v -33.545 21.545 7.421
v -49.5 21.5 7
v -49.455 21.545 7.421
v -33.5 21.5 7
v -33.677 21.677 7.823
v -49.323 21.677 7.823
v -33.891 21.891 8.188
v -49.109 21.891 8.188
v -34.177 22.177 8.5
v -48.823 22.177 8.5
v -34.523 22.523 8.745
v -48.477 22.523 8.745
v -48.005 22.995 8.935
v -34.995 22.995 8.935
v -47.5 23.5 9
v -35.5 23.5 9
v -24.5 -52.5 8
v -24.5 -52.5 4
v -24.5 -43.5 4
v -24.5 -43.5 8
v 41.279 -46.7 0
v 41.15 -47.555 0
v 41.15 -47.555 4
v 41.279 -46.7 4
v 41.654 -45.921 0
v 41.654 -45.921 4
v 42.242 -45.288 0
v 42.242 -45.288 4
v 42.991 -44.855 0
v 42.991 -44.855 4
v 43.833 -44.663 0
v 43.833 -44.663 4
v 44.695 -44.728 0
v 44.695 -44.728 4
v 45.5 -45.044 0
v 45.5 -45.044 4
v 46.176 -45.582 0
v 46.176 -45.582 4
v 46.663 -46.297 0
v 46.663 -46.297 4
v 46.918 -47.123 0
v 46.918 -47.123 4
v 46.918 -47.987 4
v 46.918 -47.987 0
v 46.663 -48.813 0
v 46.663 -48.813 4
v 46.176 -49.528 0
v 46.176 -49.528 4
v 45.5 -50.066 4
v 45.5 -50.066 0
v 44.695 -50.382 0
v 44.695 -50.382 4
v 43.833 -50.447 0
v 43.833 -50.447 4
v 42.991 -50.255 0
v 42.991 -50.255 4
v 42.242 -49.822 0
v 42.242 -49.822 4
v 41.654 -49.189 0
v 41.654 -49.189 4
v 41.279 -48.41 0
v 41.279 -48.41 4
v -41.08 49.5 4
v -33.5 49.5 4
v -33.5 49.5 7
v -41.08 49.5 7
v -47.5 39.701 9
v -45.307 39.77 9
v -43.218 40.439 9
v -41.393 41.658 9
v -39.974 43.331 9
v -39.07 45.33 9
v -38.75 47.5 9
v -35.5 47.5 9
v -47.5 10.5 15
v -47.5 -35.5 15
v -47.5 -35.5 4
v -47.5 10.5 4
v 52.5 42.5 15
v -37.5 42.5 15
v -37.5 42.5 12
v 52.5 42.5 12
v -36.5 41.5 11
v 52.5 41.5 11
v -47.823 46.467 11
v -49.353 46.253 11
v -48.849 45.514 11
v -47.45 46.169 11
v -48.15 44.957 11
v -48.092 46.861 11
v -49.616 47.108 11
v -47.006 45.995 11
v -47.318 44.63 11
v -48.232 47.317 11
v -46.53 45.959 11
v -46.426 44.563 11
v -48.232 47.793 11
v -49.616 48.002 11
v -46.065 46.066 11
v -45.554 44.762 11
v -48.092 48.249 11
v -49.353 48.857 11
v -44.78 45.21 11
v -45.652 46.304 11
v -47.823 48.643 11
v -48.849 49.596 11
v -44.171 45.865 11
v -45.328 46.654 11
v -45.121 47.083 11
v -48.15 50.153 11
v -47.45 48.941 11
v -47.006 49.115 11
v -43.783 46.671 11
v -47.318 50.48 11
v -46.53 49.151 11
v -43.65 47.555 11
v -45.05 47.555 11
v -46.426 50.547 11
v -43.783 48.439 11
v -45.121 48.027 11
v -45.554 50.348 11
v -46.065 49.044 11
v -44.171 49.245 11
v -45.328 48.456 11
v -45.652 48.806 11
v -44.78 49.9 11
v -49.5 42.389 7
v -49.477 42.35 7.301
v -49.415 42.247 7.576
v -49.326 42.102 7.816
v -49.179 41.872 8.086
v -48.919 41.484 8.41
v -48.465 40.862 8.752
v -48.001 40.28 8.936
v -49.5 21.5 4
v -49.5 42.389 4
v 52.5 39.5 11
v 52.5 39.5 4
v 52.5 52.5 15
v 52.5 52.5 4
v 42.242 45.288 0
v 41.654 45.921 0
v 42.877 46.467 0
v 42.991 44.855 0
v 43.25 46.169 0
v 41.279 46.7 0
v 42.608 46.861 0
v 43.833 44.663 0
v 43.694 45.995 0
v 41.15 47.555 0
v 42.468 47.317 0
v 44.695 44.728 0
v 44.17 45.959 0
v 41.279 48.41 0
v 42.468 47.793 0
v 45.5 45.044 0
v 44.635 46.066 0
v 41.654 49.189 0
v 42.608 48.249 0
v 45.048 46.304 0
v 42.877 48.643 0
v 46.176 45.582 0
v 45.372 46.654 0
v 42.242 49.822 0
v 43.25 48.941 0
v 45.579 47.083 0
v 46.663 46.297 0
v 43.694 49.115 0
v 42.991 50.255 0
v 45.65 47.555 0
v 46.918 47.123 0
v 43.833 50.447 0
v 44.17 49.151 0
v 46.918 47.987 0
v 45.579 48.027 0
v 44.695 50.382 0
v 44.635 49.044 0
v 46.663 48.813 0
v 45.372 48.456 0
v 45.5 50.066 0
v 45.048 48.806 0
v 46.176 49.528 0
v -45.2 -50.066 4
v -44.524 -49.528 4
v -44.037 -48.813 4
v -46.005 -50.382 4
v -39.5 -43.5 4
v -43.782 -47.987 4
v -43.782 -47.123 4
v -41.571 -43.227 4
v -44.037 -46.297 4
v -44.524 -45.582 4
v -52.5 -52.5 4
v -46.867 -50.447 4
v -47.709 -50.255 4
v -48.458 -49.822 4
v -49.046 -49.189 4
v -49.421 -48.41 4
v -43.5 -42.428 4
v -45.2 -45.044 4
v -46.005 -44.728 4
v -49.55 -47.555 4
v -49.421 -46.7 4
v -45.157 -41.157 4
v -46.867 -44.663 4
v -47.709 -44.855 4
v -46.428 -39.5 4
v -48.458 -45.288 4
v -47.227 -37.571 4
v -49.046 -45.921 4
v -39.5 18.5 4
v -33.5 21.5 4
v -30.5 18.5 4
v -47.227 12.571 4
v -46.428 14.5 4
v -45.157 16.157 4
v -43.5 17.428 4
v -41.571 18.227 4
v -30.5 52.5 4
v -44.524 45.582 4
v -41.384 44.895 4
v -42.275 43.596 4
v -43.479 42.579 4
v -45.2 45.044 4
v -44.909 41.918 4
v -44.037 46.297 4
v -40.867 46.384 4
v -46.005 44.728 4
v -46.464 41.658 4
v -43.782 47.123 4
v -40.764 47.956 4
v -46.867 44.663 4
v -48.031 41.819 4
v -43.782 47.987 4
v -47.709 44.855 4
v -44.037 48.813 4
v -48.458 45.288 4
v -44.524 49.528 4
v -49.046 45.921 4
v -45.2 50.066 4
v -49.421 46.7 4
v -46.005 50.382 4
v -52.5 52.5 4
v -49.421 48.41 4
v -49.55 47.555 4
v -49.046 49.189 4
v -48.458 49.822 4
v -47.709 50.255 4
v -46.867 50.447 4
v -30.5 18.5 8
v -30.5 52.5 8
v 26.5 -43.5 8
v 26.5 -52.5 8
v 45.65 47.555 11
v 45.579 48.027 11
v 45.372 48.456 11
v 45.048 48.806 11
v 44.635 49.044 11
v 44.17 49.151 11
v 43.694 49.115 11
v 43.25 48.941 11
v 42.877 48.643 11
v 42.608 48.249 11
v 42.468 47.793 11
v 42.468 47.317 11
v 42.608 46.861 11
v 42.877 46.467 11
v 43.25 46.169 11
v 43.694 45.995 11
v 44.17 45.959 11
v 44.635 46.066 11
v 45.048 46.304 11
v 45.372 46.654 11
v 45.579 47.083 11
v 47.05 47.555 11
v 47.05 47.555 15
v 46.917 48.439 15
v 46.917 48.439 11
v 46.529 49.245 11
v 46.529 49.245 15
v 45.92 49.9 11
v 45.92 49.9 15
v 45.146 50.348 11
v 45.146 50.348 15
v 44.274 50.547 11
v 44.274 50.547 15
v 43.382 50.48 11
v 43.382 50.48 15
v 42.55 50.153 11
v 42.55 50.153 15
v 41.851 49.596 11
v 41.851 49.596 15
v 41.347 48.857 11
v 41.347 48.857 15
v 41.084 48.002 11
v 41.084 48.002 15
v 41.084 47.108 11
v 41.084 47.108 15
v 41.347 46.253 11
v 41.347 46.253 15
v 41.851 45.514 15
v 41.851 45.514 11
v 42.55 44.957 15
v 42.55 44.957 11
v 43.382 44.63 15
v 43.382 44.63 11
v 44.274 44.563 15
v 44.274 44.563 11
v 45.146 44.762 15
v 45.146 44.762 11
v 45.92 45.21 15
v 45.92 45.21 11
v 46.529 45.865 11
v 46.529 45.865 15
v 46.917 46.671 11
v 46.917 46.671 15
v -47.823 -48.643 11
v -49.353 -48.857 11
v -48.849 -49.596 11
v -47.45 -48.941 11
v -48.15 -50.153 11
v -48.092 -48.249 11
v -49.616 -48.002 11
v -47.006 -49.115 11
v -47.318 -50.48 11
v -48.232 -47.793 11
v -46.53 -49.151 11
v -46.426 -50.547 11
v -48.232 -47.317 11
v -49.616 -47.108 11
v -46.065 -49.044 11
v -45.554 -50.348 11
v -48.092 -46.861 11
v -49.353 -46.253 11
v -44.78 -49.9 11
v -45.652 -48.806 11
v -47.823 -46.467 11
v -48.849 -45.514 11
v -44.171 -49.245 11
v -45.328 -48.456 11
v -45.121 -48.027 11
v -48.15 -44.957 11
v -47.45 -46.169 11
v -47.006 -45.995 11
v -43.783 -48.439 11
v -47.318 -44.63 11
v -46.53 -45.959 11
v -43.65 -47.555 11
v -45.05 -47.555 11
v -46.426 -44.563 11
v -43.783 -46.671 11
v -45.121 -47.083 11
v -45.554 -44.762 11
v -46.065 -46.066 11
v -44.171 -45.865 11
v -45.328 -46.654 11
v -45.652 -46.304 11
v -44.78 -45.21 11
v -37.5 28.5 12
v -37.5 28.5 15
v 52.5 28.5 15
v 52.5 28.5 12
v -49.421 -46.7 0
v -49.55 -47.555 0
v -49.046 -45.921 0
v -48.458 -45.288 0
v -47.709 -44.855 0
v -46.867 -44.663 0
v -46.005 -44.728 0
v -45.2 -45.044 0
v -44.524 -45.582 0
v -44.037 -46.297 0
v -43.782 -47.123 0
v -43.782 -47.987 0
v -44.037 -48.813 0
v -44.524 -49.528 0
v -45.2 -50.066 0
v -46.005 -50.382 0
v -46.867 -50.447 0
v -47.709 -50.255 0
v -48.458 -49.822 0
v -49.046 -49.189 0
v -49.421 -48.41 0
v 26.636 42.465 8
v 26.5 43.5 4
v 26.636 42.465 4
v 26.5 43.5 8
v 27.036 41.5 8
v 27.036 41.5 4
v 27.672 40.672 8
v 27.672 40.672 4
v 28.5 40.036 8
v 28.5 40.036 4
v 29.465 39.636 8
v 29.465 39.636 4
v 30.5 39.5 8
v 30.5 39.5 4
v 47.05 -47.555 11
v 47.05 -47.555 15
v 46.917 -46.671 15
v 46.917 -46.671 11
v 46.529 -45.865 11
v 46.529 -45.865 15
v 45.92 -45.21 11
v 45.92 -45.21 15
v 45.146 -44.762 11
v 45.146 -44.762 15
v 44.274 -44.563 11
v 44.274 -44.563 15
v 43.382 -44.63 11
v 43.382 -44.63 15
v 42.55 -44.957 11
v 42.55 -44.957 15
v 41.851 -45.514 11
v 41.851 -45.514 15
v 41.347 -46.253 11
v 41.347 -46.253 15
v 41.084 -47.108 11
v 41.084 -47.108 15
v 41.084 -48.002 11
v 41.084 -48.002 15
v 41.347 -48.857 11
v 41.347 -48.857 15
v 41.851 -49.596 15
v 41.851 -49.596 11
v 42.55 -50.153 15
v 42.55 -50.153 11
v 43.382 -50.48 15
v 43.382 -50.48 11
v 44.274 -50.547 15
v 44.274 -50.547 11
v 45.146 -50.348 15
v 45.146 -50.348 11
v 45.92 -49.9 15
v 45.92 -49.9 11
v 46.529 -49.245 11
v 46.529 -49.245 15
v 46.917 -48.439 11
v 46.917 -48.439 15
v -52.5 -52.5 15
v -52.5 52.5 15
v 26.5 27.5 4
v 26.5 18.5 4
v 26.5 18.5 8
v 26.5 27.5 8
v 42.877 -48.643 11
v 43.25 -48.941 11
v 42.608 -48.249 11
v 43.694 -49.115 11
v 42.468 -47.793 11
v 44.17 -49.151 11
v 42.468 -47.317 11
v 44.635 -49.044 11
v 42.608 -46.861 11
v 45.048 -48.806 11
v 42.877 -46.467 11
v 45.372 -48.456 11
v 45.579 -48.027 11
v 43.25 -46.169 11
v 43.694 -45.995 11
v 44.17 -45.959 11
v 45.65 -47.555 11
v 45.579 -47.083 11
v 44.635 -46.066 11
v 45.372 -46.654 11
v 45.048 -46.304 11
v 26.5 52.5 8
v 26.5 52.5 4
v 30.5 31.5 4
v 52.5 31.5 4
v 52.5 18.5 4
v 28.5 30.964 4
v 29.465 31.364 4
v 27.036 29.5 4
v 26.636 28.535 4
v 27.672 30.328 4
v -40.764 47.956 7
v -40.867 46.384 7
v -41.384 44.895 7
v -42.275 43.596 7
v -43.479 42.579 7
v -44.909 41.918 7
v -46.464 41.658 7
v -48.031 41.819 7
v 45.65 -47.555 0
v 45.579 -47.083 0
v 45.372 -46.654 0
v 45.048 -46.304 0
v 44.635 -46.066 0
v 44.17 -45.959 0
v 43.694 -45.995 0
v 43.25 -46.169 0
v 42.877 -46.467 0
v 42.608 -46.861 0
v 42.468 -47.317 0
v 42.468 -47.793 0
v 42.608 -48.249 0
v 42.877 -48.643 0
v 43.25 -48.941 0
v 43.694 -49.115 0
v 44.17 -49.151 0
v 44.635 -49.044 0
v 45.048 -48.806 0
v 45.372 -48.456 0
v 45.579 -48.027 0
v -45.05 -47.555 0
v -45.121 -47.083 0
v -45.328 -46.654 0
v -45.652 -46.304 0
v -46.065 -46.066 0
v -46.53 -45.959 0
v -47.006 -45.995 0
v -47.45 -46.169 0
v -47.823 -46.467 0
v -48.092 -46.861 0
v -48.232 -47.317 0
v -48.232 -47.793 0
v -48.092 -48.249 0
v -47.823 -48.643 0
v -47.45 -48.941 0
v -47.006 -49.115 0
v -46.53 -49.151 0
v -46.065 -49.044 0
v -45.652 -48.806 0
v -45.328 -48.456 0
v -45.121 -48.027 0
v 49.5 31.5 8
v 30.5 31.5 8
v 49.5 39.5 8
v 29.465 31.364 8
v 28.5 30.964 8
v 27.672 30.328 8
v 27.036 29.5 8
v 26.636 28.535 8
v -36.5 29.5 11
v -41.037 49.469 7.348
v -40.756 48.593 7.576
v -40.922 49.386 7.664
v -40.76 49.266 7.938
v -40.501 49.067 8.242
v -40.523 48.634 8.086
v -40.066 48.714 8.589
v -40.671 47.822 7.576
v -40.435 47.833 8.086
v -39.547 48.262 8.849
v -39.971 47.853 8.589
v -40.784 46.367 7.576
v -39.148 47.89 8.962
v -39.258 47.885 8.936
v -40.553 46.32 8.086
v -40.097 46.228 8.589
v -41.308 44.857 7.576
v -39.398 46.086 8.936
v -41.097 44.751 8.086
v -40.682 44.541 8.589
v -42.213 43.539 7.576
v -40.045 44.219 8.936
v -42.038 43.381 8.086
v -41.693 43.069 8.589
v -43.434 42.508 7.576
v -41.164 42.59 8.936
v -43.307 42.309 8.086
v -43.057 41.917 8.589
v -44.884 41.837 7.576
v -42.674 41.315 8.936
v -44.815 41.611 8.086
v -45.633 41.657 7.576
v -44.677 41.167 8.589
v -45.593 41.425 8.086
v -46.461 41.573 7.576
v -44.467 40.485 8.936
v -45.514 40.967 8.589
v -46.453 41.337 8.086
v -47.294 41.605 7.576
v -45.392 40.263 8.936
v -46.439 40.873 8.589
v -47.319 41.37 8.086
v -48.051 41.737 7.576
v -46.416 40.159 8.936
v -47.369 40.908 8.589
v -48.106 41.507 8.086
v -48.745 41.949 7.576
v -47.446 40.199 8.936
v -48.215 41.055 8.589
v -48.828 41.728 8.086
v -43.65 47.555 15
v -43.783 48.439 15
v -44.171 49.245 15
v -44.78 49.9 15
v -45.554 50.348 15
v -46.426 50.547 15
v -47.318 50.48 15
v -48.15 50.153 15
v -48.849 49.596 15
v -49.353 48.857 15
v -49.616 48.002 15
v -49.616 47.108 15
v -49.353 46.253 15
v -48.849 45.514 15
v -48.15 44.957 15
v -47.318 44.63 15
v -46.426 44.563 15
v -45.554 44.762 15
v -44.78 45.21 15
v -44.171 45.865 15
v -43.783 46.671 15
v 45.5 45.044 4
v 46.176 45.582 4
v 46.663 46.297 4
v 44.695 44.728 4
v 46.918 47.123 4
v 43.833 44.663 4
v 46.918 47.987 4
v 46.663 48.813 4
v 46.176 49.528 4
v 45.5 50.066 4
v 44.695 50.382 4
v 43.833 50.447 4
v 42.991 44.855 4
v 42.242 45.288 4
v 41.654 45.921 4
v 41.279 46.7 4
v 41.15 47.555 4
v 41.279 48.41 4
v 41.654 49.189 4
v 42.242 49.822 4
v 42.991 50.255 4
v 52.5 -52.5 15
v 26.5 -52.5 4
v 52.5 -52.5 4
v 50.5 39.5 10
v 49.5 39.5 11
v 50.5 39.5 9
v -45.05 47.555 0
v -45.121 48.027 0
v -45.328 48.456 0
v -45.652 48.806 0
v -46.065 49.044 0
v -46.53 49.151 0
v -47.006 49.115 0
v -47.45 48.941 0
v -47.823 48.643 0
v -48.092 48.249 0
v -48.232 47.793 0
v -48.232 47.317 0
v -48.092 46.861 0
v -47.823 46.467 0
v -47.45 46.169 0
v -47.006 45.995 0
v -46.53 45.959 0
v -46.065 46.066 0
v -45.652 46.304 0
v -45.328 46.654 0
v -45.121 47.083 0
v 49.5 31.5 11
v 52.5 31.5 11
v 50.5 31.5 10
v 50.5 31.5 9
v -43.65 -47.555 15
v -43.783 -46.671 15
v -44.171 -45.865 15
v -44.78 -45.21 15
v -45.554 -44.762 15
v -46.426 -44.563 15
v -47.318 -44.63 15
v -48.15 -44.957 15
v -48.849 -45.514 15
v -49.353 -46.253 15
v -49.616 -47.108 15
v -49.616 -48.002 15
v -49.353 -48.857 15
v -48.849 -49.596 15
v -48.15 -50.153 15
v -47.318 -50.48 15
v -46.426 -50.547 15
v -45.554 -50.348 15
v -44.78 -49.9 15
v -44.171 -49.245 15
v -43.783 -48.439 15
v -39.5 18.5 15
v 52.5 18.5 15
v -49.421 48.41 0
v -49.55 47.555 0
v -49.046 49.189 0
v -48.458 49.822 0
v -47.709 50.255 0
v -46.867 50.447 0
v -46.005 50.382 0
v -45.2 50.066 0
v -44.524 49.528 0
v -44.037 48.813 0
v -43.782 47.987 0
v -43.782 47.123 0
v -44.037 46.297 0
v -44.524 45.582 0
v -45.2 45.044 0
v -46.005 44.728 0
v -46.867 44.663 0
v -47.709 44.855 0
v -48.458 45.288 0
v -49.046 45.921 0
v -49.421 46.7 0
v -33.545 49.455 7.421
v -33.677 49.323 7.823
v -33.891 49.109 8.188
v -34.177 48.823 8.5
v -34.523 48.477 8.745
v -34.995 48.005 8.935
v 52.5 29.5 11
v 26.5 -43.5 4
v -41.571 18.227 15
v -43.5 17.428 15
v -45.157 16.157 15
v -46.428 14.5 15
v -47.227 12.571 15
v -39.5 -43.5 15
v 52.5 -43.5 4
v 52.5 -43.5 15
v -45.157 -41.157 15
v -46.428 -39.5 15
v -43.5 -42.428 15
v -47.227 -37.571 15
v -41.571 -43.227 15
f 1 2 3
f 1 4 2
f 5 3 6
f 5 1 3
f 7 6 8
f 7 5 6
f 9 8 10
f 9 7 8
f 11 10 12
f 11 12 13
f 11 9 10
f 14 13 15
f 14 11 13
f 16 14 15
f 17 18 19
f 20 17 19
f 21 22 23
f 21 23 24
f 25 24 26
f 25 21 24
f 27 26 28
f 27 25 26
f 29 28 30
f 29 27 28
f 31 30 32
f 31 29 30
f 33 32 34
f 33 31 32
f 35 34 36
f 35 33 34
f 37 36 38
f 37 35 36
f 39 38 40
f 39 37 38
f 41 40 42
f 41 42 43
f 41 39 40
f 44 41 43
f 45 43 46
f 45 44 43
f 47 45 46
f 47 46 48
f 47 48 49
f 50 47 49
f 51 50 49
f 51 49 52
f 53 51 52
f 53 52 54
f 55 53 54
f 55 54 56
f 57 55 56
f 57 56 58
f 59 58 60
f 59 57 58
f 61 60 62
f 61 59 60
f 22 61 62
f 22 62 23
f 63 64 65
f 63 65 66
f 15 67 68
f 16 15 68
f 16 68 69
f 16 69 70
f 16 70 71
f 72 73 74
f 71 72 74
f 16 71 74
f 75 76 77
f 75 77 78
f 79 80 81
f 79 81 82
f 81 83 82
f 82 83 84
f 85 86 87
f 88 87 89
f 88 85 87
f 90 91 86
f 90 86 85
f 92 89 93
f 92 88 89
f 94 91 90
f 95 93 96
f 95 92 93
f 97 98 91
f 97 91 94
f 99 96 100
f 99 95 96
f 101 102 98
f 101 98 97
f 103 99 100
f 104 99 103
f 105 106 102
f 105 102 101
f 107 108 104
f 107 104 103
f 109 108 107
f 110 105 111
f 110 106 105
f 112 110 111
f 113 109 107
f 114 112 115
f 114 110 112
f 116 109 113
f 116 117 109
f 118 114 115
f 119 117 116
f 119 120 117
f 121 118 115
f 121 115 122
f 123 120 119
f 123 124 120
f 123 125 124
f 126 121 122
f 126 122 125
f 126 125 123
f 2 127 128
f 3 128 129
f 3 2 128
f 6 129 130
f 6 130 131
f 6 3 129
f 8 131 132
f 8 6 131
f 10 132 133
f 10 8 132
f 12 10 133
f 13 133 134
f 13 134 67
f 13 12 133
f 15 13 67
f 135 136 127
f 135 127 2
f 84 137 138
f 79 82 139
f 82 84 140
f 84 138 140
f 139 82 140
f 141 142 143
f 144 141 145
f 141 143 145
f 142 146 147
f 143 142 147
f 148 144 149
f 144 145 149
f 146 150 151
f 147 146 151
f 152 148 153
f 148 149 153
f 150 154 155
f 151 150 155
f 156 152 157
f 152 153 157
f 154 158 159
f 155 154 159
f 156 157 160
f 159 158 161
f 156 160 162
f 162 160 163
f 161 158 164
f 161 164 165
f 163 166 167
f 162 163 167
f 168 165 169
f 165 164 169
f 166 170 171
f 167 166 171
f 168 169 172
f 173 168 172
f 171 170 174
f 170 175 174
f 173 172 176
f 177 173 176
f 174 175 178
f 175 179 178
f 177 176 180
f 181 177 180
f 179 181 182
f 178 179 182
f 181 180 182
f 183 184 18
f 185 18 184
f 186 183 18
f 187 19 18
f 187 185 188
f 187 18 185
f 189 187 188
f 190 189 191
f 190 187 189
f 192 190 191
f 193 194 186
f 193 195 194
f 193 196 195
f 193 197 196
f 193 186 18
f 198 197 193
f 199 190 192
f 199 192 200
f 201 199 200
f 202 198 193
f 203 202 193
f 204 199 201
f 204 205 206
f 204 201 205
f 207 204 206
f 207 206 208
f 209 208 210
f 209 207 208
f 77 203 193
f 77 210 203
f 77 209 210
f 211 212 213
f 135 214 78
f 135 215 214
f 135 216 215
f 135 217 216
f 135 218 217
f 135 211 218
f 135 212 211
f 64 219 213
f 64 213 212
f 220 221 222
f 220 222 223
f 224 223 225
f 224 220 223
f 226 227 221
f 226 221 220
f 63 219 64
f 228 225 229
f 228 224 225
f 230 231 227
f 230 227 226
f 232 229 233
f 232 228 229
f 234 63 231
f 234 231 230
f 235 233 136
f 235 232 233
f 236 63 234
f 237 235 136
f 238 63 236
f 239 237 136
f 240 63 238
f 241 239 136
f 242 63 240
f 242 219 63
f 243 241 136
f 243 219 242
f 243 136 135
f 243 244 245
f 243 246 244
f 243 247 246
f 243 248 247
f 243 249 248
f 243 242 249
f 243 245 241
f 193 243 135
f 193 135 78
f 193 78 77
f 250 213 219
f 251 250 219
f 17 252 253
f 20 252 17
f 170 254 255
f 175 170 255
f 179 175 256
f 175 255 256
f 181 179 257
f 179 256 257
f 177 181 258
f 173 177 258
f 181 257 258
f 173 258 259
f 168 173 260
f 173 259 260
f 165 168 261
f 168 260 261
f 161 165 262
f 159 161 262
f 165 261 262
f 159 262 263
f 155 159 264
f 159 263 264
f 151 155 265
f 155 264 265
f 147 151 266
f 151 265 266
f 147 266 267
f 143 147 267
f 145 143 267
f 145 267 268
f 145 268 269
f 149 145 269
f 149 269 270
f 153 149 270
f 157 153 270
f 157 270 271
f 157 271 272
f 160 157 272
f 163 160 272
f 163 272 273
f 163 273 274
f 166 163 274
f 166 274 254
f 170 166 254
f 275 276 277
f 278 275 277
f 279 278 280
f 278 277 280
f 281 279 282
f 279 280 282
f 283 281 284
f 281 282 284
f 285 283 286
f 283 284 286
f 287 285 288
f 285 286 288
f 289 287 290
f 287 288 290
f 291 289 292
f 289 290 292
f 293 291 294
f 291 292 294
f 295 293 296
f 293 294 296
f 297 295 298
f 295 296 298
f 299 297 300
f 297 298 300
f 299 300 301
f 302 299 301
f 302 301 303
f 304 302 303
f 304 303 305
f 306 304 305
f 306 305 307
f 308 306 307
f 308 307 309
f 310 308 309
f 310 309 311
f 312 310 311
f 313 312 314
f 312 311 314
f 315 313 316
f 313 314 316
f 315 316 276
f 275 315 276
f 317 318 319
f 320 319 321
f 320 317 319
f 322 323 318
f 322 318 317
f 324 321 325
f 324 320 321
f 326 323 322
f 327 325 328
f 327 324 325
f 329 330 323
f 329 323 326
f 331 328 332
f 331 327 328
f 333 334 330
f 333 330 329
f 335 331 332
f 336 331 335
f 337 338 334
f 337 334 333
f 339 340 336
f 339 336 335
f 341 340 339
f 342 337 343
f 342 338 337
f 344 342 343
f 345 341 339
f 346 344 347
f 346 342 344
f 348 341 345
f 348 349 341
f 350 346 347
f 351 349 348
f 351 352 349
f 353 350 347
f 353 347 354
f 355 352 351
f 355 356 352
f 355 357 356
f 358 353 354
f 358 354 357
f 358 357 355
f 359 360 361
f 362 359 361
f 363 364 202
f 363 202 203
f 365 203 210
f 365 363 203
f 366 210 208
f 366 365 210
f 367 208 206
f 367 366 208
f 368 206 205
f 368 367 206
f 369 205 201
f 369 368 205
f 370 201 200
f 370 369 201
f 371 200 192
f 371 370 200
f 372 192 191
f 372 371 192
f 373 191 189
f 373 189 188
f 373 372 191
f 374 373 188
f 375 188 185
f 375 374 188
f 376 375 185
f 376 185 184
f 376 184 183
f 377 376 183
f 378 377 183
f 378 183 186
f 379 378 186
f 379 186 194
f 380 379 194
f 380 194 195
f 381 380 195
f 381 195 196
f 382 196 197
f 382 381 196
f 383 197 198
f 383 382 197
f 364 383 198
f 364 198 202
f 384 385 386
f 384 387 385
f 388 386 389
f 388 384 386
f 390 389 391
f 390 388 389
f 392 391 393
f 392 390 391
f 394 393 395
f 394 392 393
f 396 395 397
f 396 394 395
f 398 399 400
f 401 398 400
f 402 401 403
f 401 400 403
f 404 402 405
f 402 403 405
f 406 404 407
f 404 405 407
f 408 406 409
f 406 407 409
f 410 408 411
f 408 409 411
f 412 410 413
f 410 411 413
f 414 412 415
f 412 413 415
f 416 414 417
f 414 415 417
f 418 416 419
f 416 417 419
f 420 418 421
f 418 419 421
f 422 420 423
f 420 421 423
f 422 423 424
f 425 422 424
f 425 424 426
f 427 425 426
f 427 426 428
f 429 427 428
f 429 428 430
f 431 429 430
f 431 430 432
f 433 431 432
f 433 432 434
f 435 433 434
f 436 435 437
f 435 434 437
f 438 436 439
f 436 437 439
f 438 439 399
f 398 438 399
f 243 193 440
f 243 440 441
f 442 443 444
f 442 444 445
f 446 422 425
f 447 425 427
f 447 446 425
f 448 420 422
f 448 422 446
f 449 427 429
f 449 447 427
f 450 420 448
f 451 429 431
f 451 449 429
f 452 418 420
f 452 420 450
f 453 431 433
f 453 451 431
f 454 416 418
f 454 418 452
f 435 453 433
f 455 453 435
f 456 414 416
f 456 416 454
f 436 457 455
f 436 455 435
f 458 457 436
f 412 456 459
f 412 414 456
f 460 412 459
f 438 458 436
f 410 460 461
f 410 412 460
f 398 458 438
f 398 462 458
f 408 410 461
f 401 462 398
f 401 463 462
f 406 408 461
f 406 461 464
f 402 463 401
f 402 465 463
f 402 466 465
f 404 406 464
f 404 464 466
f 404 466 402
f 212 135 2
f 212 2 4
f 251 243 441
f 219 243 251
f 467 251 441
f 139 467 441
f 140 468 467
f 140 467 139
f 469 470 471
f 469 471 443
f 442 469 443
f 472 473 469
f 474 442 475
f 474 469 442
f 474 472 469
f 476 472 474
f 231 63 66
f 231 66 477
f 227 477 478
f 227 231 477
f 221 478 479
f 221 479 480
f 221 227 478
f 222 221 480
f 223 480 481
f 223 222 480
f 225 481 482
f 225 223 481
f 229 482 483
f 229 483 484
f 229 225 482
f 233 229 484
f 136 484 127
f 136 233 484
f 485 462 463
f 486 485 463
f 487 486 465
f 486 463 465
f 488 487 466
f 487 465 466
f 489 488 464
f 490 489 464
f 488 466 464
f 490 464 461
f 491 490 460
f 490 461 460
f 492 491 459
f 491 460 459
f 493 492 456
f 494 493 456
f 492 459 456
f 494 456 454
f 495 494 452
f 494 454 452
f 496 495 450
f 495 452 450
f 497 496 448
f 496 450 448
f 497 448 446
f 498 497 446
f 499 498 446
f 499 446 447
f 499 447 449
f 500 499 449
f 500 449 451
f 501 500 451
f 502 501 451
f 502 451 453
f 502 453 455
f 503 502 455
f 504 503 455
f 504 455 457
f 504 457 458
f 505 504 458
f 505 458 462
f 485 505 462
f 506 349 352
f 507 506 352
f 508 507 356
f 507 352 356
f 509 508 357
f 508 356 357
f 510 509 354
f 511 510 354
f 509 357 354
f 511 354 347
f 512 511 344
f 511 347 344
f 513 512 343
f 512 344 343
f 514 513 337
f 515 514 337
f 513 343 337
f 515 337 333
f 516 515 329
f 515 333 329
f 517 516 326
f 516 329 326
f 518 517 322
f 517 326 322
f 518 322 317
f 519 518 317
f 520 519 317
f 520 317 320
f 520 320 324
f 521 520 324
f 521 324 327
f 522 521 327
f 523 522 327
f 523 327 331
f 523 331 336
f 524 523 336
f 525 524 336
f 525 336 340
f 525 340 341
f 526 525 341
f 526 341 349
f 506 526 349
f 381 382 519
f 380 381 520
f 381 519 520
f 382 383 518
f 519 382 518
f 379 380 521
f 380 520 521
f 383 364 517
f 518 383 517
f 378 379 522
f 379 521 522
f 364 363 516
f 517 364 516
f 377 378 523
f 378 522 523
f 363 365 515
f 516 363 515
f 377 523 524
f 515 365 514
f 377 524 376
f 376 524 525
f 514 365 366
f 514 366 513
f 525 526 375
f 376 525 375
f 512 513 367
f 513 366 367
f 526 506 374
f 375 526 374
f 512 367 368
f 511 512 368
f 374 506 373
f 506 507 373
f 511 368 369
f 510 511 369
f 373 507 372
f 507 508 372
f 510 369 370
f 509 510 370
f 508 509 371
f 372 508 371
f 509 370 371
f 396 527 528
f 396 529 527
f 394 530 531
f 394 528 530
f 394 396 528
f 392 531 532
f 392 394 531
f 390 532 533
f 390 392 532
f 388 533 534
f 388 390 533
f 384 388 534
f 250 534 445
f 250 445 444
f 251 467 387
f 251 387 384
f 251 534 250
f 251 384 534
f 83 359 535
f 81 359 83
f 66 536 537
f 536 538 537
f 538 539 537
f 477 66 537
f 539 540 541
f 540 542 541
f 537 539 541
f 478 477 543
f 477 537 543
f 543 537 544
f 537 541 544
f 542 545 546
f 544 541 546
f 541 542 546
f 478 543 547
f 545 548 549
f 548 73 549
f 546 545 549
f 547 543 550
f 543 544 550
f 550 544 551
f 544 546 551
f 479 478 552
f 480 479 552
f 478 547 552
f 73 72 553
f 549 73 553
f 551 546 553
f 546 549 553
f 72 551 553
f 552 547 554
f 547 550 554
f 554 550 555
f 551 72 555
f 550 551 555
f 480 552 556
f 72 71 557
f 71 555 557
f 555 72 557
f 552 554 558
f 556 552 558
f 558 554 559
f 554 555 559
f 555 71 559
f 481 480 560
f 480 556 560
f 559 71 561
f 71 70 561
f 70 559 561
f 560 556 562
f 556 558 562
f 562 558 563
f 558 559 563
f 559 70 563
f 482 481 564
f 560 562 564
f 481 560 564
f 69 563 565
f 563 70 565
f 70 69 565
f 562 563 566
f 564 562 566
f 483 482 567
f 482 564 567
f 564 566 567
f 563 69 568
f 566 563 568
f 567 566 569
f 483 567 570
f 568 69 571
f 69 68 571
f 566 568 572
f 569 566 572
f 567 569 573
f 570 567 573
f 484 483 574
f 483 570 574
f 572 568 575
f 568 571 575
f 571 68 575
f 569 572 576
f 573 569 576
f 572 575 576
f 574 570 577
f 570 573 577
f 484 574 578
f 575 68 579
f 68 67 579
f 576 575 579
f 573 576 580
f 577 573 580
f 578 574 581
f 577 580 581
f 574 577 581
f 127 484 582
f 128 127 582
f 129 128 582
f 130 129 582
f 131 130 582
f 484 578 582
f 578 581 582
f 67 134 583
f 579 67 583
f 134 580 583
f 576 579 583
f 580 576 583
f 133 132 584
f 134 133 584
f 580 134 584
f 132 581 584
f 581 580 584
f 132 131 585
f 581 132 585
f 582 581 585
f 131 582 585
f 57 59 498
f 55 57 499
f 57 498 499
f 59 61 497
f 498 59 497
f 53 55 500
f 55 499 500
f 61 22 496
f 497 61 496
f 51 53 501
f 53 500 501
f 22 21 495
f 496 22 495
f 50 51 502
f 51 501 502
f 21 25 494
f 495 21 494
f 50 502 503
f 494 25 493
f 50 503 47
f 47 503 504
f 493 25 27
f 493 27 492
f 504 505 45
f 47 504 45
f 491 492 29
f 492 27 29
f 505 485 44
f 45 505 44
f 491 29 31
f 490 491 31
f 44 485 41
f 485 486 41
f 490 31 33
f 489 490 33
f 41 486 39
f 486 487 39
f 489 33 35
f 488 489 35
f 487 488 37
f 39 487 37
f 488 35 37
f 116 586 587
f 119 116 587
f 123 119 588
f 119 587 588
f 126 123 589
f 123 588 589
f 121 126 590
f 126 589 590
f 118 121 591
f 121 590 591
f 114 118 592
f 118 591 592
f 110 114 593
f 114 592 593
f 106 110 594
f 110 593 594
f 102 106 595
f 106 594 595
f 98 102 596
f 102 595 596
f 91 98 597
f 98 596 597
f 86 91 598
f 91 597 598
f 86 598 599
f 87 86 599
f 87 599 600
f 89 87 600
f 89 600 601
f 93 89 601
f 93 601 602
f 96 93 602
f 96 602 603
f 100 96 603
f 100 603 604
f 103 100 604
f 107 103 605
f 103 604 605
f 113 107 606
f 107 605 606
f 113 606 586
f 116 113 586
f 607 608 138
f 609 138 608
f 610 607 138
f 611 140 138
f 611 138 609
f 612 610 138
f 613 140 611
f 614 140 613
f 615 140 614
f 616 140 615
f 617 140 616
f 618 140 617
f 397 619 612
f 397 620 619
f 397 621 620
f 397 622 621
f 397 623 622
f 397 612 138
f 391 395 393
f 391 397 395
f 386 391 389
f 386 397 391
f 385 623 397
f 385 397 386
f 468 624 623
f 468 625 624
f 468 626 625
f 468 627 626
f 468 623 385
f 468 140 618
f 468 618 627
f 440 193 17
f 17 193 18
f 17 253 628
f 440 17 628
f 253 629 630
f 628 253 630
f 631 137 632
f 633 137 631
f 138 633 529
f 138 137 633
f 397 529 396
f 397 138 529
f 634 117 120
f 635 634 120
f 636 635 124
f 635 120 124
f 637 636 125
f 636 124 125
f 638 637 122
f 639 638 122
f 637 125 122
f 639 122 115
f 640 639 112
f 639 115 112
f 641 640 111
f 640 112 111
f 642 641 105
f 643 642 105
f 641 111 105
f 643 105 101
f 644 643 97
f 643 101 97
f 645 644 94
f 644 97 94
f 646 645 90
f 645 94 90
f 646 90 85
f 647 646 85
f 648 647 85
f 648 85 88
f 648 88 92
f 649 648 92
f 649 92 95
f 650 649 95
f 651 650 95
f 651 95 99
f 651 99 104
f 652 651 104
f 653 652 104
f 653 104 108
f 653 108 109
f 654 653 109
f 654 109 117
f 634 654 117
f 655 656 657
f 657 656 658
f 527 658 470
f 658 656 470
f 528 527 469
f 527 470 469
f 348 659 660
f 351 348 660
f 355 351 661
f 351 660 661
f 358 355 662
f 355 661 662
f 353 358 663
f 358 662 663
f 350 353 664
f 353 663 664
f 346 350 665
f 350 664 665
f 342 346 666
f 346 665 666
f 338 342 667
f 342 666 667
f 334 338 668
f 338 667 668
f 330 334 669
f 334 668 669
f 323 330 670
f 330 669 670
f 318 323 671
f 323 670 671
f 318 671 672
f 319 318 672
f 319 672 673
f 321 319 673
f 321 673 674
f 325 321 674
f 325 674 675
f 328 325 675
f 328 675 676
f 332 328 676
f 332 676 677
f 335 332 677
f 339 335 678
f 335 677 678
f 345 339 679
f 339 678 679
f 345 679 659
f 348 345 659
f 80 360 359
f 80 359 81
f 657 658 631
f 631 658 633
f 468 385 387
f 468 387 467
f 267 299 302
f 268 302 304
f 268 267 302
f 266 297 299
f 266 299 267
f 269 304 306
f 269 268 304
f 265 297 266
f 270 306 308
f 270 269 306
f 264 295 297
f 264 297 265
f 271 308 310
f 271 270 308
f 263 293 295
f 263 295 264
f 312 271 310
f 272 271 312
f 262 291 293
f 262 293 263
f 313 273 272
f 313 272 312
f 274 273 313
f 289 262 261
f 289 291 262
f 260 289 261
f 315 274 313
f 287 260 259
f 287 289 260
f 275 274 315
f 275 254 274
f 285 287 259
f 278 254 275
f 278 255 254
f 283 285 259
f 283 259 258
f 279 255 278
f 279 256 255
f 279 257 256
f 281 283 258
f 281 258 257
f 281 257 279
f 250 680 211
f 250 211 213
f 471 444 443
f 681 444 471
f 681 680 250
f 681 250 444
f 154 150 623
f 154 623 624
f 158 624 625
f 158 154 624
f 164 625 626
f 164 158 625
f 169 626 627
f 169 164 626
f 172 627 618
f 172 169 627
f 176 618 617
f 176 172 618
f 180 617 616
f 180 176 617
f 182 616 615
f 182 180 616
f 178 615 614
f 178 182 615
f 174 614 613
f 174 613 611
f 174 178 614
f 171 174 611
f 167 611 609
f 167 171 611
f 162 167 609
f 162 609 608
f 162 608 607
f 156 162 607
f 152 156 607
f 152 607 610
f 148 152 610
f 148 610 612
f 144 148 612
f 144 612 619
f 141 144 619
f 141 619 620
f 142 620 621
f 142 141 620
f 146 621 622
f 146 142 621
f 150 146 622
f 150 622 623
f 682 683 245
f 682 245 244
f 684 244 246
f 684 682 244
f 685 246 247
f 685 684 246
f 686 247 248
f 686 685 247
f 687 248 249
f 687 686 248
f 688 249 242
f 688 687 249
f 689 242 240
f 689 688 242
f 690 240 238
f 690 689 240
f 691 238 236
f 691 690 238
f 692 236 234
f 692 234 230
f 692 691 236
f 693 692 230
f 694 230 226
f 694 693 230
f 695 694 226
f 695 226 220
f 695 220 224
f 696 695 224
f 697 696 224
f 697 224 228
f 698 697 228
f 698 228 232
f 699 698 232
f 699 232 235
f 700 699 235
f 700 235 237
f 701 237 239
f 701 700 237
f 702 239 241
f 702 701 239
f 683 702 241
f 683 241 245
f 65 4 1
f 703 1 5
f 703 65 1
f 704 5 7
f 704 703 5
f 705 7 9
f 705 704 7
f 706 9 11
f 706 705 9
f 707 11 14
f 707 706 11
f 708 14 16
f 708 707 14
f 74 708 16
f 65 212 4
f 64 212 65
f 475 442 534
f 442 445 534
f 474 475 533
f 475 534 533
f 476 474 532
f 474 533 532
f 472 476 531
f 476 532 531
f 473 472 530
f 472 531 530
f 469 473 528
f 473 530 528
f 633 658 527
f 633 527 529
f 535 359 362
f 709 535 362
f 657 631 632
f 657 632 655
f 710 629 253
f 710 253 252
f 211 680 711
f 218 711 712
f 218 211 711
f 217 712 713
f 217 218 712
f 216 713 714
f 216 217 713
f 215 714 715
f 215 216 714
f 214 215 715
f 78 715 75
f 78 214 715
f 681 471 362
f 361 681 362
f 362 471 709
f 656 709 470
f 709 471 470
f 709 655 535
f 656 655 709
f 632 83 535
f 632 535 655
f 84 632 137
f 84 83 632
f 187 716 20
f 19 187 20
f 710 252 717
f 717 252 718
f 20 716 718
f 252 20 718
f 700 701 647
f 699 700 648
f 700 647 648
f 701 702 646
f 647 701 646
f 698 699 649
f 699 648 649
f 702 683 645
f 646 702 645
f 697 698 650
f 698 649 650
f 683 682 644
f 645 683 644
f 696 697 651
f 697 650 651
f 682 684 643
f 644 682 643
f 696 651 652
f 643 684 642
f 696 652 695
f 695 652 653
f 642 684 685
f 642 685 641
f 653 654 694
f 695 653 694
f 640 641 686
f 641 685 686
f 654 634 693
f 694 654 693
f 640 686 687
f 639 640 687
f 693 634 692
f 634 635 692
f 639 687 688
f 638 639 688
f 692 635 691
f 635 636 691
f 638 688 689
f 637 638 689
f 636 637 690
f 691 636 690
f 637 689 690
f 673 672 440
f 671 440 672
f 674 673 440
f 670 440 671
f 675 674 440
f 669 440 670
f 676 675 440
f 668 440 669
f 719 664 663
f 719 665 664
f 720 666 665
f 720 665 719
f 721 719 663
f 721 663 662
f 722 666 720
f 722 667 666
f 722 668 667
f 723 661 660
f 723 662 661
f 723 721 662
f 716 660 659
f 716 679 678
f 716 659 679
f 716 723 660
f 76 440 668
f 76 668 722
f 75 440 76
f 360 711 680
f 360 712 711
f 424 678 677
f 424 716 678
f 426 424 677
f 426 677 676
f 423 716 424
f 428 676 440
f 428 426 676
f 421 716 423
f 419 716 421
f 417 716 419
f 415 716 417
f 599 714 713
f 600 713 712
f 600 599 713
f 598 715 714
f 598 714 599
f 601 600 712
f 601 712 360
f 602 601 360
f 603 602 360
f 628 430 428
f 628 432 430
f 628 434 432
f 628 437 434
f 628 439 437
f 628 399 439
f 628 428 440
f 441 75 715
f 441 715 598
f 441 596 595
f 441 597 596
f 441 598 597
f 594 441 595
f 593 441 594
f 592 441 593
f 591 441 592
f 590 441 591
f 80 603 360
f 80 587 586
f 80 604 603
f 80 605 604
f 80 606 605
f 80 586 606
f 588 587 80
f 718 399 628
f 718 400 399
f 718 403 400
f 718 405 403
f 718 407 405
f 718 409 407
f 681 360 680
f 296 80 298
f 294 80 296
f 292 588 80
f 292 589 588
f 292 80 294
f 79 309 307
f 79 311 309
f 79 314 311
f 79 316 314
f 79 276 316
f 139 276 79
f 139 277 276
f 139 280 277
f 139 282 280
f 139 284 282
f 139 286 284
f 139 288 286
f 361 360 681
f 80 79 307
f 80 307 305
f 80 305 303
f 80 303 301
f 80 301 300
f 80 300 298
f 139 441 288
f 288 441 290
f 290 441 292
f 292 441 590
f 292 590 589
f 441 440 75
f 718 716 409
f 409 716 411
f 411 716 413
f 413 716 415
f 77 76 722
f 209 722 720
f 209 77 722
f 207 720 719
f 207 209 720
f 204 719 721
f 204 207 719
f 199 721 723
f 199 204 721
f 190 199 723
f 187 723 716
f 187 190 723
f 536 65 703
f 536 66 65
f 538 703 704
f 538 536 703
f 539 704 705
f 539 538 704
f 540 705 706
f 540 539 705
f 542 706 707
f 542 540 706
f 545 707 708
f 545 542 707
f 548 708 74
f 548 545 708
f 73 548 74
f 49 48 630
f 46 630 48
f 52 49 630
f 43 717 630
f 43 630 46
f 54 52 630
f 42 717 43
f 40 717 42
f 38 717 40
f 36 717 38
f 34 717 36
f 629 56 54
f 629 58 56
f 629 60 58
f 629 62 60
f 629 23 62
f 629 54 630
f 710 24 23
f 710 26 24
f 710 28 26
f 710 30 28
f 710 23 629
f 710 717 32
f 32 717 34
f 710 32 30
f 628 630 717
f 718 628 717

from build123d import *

# Parameters (mm, degrees)
SKETCH_1_W           = 105
SKETCH_1_H           = 105
EXTRUDE_1_DEPTH      = 15
SKETCH_2_R           = 1.6
CUT_EXTRUDE_1_DEPTH  = 15
SKETCH_3_W           = 100
SKETCH_3_H           = 62
CUT_EXTRUDE_2_DEPTH  = 15
FILLET_1_R           = 8
SKETCH_4_OUTSIDE_W   = 136.85
SKETCH_4_OUTSIDE_H   = 136.85
SKETCH_4_OUTSIDE_R   = 2.9
CUT_EXTRUDE_3_DEPTH  = 4
SKETCH_5_W           = 51
SKETCH_5_H           = 9
CUT_EXTRUDE_4_DEPTH  = 4
SKETCH_6_W           = 57
SKETCH_6_H           = 34
CUT_EXTRUDE_5_DEPTH  = 4
CUT_EXTRUDE_6_DEPTH  = 4
FILLET_2_R           = 4
SKETCH_8_W           = 90
SKETCH_8_H           = 14
CUT_EXTRUDE_7_DEPTH  = 4
CHAMFER_1_SIZE       = 1
SKETCH_9_W           = 2
SKETCH_9_H           = 8
CUT_EXTRUDE_8_DEPTH  = 4
CHAMFER_2_SIZE       = 1
SKETCH_10_R          = 3
CUT_EXTRUDE_9_DEPTH  = 4
CUT_EXTRUDE_10_DEPTH = 5
FILLET_3_R           = 2


with BuildPart() as part:
    # 草图1 → 凸台-拉伸1 (new body)
    with BuildSketch(Plane.XY):
        Rectangle(SKETCH_1_W, SKETCH_1_H)
    extrude(amount=EXTRUDE_1_DEPTH)

    # 草图2 → 切除-拉伸1 (cut)
    with BuildSketch(Plane.XY.offset(15)):
        with Locations((-46.65, 47.555)):
            Circle(SKETCH_2_R)
        with Locations((44.05, 47.555)):
            Circle(SKETCH_2_R)
        with Locations((44.05, -47.555)):
            Circle(SKETCH_2_R)
        with Locations((-46.65, -47.555)):
            Circle(SKETCH_2_R)
    extrude(amount=-CUT_EXTRUDE_1_DEPTH, mode=Mode.SUBTRACT)

    # 草图3 → 切除-拉伸2 (cut)
    with BuildSketch(Plane.XY.offset(15)):
        with Locations((2.5, -12.5)):
            Rectangle(SKETCH_3_W, SKETCH_3_H)
    extrude(amount=-CUT_EXTRUDE_2_DEPTH, mode=Mode.SUBTRACT)

    # 圆角1
    fillet_1_edges = [part.edges().sort_by_distance(p)[0] for p in [
        (-47.5, -43.5, 7.5),
        (-47.5, 18.5, 7.5),
    ]]
    fillet(fillet_1_edges, radius=FILLET_1_R)

    # 草图4 outside → 切除-拉伸3 (cut)
    with BuildSketch(Plane(origin=(0, 0, 0), x_dir=(-1, 0, 0), z_dir=(0, 0, -1))):
        Rectangle(SKETCH_4_OUTSIDE_W, SKETCH_4_OUTSIDE_H)
        with Locations((-44.05, -47.555)):
            Circle(SKETCH_4_OUTSIDE_R, mode=Mode.SUBTRACT)
        with Locations((46.65, -47.555)):
            Circle(SKETCH_4_OUTSIDE_R, mode=Mode.SUBTRACT)
        with Locations((-44.05, 47.555)):
            Circle(SKETCH_4_OUTSIDE_R, mode=Mode.SUBTRACT)
        with Locations((46.65, 47.555)):
            Circle(SKETCH_4_OUTSIDE_R, mode=Mode.SUBTRACT)
    extrude(amount=-CUT_EXTRUDE_3_DEPTH, mode=Mode.SUBTRACT)

    # 草图5 → 切除-拉伸4 (cut)
    with BuildSketch(Plane(origin=(0, 0, 4), x_dir=(-1, 0, 0), z_dir=(0, 0, -1))):
        with Locations((-1, -48)):
            Rectangle(SKETCH_5_W, SKETCH_5_H)
    extrude(amount=-CUT_EXTRUDE_4_DEPTH, mode=Mode.SUBTRACT)

    # 草图6 → 切除-拉伸5 (cut)
    with BuildSketch(Plane(origin=(0, 0, 4), x_dir=(-1, 0, 0), z_dir=(0, 0, -1))):
        with Locations((2, 35.5)):
            Rectangle(SKETCH_6_W, SKETCH_6_H)
    extrude(amount=-CUT_EXTRUDE_5_DEPTH, mode=Mode.SUBTRACT)

    # 草图7 → 切除-拉伸6 (cut)
    with BuildSketch(Plane(origin=(0, 0, 4), x_dir=(-1, 0, 0), z_dir=(0, 0, -1))):
        Polygon((-26.5, 35.5), (-26.5, 39.5), (-52.5, 39.5), (-52.5, 31.5), (-26.5, 31.5), align=None)
    extrude(amount=-CUT_EXTRUDE_6_DEPTH, mode=Mode.SUBTRACT)

    # 圆角2
    fillet_2_edges = [part.edges().sort_by_distance(p)[0] for p in [
        (26.5, 39.5, 6),
        (26.5, 31.5, 6),
    ]]
    fillet(fillet_2_edges, radius=FILLET_2_R)

    # 草图8 → 切除-拉伸7 (cut)
    with BuildSketch(Plane.XY.offset(15)):
        with Locations((7.5, 35.5)):
            Rectangle(SKETCH_8_W, SKETCH_8_H)
    extrude(amount=-CUT_EXTRUDE_7_DEPTH, mode=Mode.SUBTRACT)

    # 倒角1
    chamfer_1_edges = [part.edges().sort_by_distance(p)[0] for p in [
        (7.5, 42.5, 11),
        (7.5, 28.5, 11),
        (-37.5, 35.5, 11),
    ]]
    chamfer(chamfer_1_edges, length=CHAMFER_1_SIZE)

    # 草图9 → 切除-拉伸8 (cut)
    with BuildSketch(Plane(origin=(0, 0, 8), x_dir=(-1, 0, 0), z_dir=(0, 0, -1))):
        with Locations((-51.5, 35.5)):
            Rectangle(SKETCH_9_W, SKETCH_9_H)
    extrude(amount=-CUT_EXTRUDE_8_DEPTH, mode=Mode.SUBTRACT)

    # 倒角2
    chamfer_2_edges = [part.edges().sort_by_distance(p)[0] for p in [
        (50.5, 35.5, 11),
        (50.5, 35.5, 8),
    ]]
    chamfer(chamfer_2_edges, length=CHAMFER_2_SIZE)

    # 草图10 → 切除-拉伸9 (cut)
    with BuildSketch(Plane.XY.offset(15)):
        with Locations((-46.65, 47.555)):
            Circle(SKETCH_10_R)
        with Locations((44.05, 47.555)):
            Circle(SKETCH_10_R)
        with Locations((44.05, -47.555)):
            Circle(SKETCH_10_R)
        with Locations((-46.65, -47.555)):
            Circle(SKETCH_10_R)
    extrude(amount=-CUT_EXTRUDE_9_DEPTH, mode=Mode.SUBTRACT)

    # 草图11 → 切除-拉伸10 (cut)
    with BuildSketch(Plane(origin=(0, 0, 4), x_dir=(-1, 0, 0), z_dir=(0, 0, -1))):
        with BuildLine():
            Line((33.5, 49.5), (41.079813737, 49.5))
            ThreePointArc((41.079813737, 49.5), (42.843240971, 43.047385809), (49.5, 42.38900542))
            Line((49.5, 42.38900542), (49.5, 21.5))
            Line((49.5, 21.5), (33.5, 21.5))
            Line((33.5, 21.5), (33.5, 49.5))
        make_face()
    extrude(amount=-CUT_EXTRUDE_10_DEPTH, mode=Mode.SUBTRACT)

    # 圆角3
    fillet_3_edges = [part.edges().sort_by_distance(p)[0] for p in [
        (-42.843240971, 43.047385809, 9),
        (-49.5, 31.94450271, 9),
        (-41.5, 21.5, 9),
        (-33.5, 35.5, 9),
        (-37.289906869, 49.5, 9),
    ]]
    fillet(fillet_3_edges, radius=FILLET_3_R)


solid = part.part
